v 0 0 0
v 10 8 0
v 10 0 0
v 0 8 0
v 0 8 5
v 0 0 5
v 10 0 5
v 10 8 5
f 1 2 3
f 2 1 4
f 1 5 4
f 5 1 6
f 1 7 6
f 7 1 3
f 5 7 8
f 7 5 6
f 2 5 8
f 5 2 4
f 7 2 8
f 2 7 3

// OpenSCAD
union() {
    translate([0.0, 0.0, 0.0]) cube([1, 1, 1]);
    translate([0.0, 0.0, 1.0]) cube([1, 1, 1]);
    translate([0.0, 0.0, 2.0]) cube([1, 1, 1]);
    translate([0.0, 0.0, 3.0]) cube([1, 1, 1]);
    translate([0.0, 0.0, 4.0]) cube([1, 1, 1]);
    translate([0.0, 1.0, 0.0]) cube([1, 1, 1]);
    translate([0.0, 1.0, 1.0]) cube([1, 1, 1]);
    translate([0.0, 1.0, 2.0]) cube([1, 1, 1]);
    translate([0.0, 1.0, 3.0]) cube([1, 1, 1]);
    translate([0.0, 1.0, 4.0]) cube([1, 1, 1]);
    translate([0.0, 2.0, 0.0]) cube([1, 1, 1]);
    translate([0.0, 2.0, 1.0]) cube([1, 1, 1]);
    translate([0.0, 2.0, 2.0]) cube([1, 1, 1]);
    translate([0.0, 2.0, 3.0]) cube([1, 1, 1]);
    translate([0.0, 2.0, 4.0]) cube([1, 1, 1]);
    translate([0.0, 3.0, 0.0]) cube([1, 1, 1]);
    translate([0.0, 3.0, 1.0]) cube([1, 1, 1]);
    translate([0.0, 3.0, 2.0]) cube([1, 1, 1]);
    translate([0.0, 3.0, 3.0]) cube([1, 1, 1]);
    translate([0.0, 3.0, 4.0]) cube([1, 1, 1]);
    translate([0.0, 4.0, 0.0]) cube([1, 1, 1]);
    translate([0.0, 4.0, 1.0]) cube([1, 1, 1]);
    translate([0.0, 4.0, 2.0]) cube([1, 1, 1]);
    translate([0.0, 4.0, 3.0]) cube([1, 1, 1]);
    translate([0.0, 4.0, 4.0]) cube([1, 1, 1]);
    translate([0.0, 5.0, 0.0]) cube([1, 1, 1]);
    translate([0.0, 5.0, 1.0]) cube([1, 1, 1]);
    translate([0.0, 5.0, 2.0]) cube([1, 1, 1]);
    translate([0.0, 5.0, 3.0]) cube([1, 1, 1]);
    translate([0.0, 5.0, 4.0]) cube([1, 1, 1]);
    translate([0.0, 6.0, 0.0]) cube([1, 1, 1]);
    translate([0.0, 6.0, 1.0]) cube([1, 1, 1]);
    translate([0.0, 6.0, 2.0]) cube([1, 1, 1]);
    translate([0.0, 6.0, 3.0]) cube([1, 1, 1]);
    translate([0.0, 6.0, 4.0]) cube([1, 1, 1]);
    translate([0.0, 7.0, 0.0]) cube([1, 1, 1]);
    translate([0.0, 7.0, 1.0]) cube([1, 1, 1]);
    translate([0.0, 7.0, 2.0]) cube([1, 1, 1]);
    translate([0.0, 7.0, 3.0]) cube([1, 1, 1]);
    translate([0.0, 7.0, 4.0]) cube([1, 1, 1]);
    translate([1.0, 0.0, 0.0]) cube([1, 1, 1]);
    translate([1.0, 0.0, 1.0]) cube([1, 1, 1]);
    translate([1.0, 0.0, 2.0]) cube([1, 1, 1]);
    translate([1.0, 0.0, 3.0]) cube([1, 1, 1]);
    translate([1.0, 0.0, 4.0]) cube([1, 1, 1]);
    translate([1.0, 1.0, 0.0]) cube([1, 1, 1]);
    translate([1.0, 1.0, 1.0]) cube([1, 1, 1]);
    translate([1.0, 1.0, 2.0]) cube([1, 1, 1]);
    translate([1.0, 1.0, 3.0]) cube([1, 1, 1]);
    translate([1.0, 1.0, 4.0]) cube([1, 1, 1]);
    translate([1.0, 2.0, 0.0]) cube([1, 1, 1]);
    translate([1.0, 2.0, 1.0]) cube([1, 1, 1]);
    translate([1.0, 2.0, 2.0]) cube([1, 1, 1]);
    translate([1.0, 2.0, 3.0]) cube([1, 1, 1]);
    translate([1.0, 2.0, 4.0]) cube([1, 1, 1]);
    translate([1.0, 3.0, 0.0]) cube([1, 1, 1]);
    translate([1.0, 3.0, 1.0]) cube([1, 1, 1]);
    translate([1.0, 3.0, 2.0]) cube([1, 1, 1]);
    translate([1.0, 3.0, 3.0]) cube([1, 1, 1]);
    translate([1.0, 3.0, 4.0]) cube([1, 1, 1]);
    translate([1.0, 4.0, 0.0]) cube([1, 1, 1]);
    translate([1.0, 4.0, 1.0]) cube([1, 1, 1]);
    translate([1.0, 4.0, 2.0]) cube([1, 1, 1]);
    translate([1.0, 4.0, 3.0]) cube([1, 1, 1]);
    translate([1.0, 4.0, 4.0]) cube([1, 1, 1]);
    translate([1.0, 5.0, 0.0]) cube([1, 1, 1]);
    translate([1.0, 5.0, 1.0]) cube([1, 1, 1]);
    translate([1.0, 5.0, 2.0]) cube([1, 1, 1]);
    translate([1.0, 5.0, 3.0]) cube([1, 1, 1]);
    translate([1.0, 5.0, 4.0]) cube([1, 1, 1]);
    translate([1.0, 6.0, 0.0]) cube([1, 1, 1]);
    translate([1.0, 6.0, 1.0]) cube([1, 1, 1]);
    translate([1.0, 6.0, 2.0]) cube([1, 1, 1]);
    translate([1.0, 6.0, 3.0]) cube([1, 1, 1]);
    translate([1.0, 6.0, 4.0]) cube([1, 1, 1]);
    translate([1.0, 7.0, 0.0]) cube([1, 1, 1]);
    translate([1.0, 7.0, 1.0]) cube([1, 1, 1]);
    translate([1.0, 7.0, 2.0]) cube([1, 1, 1]);
    translate([1.0, 7.0, 3.0]) cube([1, 1, 1]);
    translate([1.0, 7.0, 4.0]) cube([1, 1, 1]);
    translate([2.0, 0.0, 0.0]) cube([1, 1, 1]);
    translate([2.0, 0.0, 1.0]) cube([1, 1, 1]);
    translate([2.0, 0.0, 2.0]) cube([1, 1, 1]);
    translate([2.0, 0.0, 3.0]) cube([1, 1, 1]);
    translate([2.0, 0.0, 4.0]) cube([1, 1, 1]);
    translate([2.0, 1.0, 0.0]) cube([1, 1, 1]);
    translate([2.0, 1.0, 1.0]) cube([1, 1, 1]);
    translate([2.0, 1.0, 2.0]) cube([1, 1, 1]);
    translate([2.0, 1.0, 3.0]) cube([1, 1, 1]);
    translate([2.0, 1.0, 4.0]) cube([1, 1, 1]);
    translate([2.0, 2.0, 0.0]) cube([1, 1, 1]);
    translate([2.0, 2.0, 1.0]) cube([1, 1, 1]);
    translate([2.0, 2.0, 2.0]) cube([1, 1, 1]);
    translate([2.0, 2.0, 3.0]) cube([1, 1, 1]);
    translate([2.0, 2.0, 4.0]) cube([1, 1, 1]);
    translate([2.0, 3.0, 0.0]) cube([1, 1, 1]);
    translate([2.0, 3.0, 1.0]) cube([1, 1, 1]);
    translate([2.0, 3.0, 2.0]) cube([1, 1, 1]);
    translate([2.0, 3.0, 3.0]) cube([1, 1, 1]);
    translate([2.0, 3.0, 4.0]) cube([1, 1, 1]);
    translate([2.0, 4.0, 0.0]) cube([1, 1, 1]);
    translate([2.0, 4.0, 1.0]) cube([1, 1, 1]);
    translate([2.0, 4.0, 2.0]) cube([1, 1, 1]);
    translate([2.0, 4.0, 3.0]) cube([1, 1, 1]);
    translate([2.0, 4.0, 4.0]) cube([1, 1, 1]);
    translate([2.0, 5.0, 0.0]) cube([1, 1, 1]);
    translate([2.0, 5.0, 1.0]) cube([1, 1, 1]);
    translate([2.0, 5.0, 2.0]) cube([1, 1, 1]);
    translate([2.0, 5.0, 3.0]) cube([1, 1, 1]);
    translate([2.0, 5.0, 4.0]) cube([1, 1, 1]);
    translate([2.0, 6.0, 0.0]) cube([1, 1, 1]);
    translate([2.0, 6.0, 1.0]) cube([1, 1, 1]);
    translate([2.0, 6.0, 2.0]) cube([1, 1, 1]);
    translate([2.0, 6.0, 3.0]) cube([1, 1, 1]);
    translate([2.0, 6.0, 4.0]) cube([1, 1, 1]);
    translate([2.0, 7.0, 0.0]) cube([1, 1, 1]);
    translate([2.0, 7.0, 1.0]) cube([1, 1, 1]);
    translate([2.0, 7.0, 2.0]) cube([1, 1, 1]);
    translate([2.0, 7.0, 3.0]) cube([1, 1, 1]);
    translate([2.0, 7.0, 4.0]) cube([1, 1, 1]);
    translate([3.0, 0.0, 0.0]) cube([1, 1, 1]);
    translate([3.0, 0.0, 1.0]) cube([1, 1, 1]);
    translate([3.0, 0.0, 2.0]) cube([1, 1, 1]);
    translate([3.0, 0.0, 3.0]) cube([1, 1, 1]);
    translate([3.0, 0.0, 4.0]) cube([1, 1, 1]);
    translate([3.0, 1.0, 0.0]) cube([1, 1, 1]);
    translate([3.0, 1.0, 1.0]) cube([1, 1, 1]);
    translate([3.0, 1.0, 2.0]) cube([1, 1, 1]);
    translate([3.0, 1.0, 3.0]) cube([1, 1, 1]);
    translate([3.0, 1.0, 4.0]) cube([1, 1, 1]);
    translate([3.0, 2.0, 0.0]) cube([1, 1, 1]);
    translate([3.0, 2.0, 1.0]) cube([1, 1, 1]);
    translate([3.0, 2.0, 2.0]) cube([1, 1, 1]);
    translate([3.0, 2.0, 3.0]) cube([1, 1, 1]);
    translate([3.0, 2.0, 4.0]) cube([1, 1, 1]);
    translate([3.0, 3.0, 0.0]) cube([1, 1, 1]);
    translate([3.0, 3.0, 1.0]) cube([1, 1, 1]);
    translate([3.0, 3.0, 2.0]) cube([1, 1, 1]);
    translate([3.0, 3.0, 3.0]) cube([1, 1, 1]);
    translate([3.0, 3.0, 4.0]) cube([1, 1, 1]);
    translate([3.0, 4.0, 0.0]) cube([1, 1, 1]);
    translate([3.0, 4.0, 1.0]) cube([1, 1, 1]);
    translate([3.0, 4.0, 2.0]) cube([1, 1, 1]);
    translate([3.0, 4.0, 3.0]) cube([1, 1, 1]);
    translate([3.0, 4.0, 4.0]) cube([1, 1, 1]);
    translate([3.0, 5.0, 0.0]) cube([1, 1, 1]);
    translate([3.0, 5.0, 1.0]) cube([1, 1, 1]);
    translate([3.0, 5.0, 2.0]) cube([1, 1, 1]);
    translate([3.0, 5.0, 3.0]) cube([1, 1, 1]);
    translate([3.0, 5.0, 4.0]) cube([1, 1, 1]);
    translate([3.0, 6.0, 0.0]) cube([1, 1, 1]);
    translate([3.0, 6.0, 1.0]) cube([1, 1, 1]);
    translate([3.0, 6.0, 2.0]) cube([1, 1, 1]);
    translate([3.0, 6.0, 3.0]) cube([1, 1, 1]);
    translate([3.0, 6.0, 4.0]) cube([1, 1, 1]);
    translate([3.0, 7.0, 0.0]) cube([1, 1, 1]);
    translate([3.0, 7.0, 1.0]) cube([1, 1, 1]);
    translate([3.0, 7.0, 2.0]) cube([1, 1, 1]);
    translate([3.0, 7.0, 3.0]) cube([1, 1, 1]);
    translate([3.0, 7.0, 4.0]) cube([1, 1, 1]);
    translate([4.0, 0.0, 0.0]) cube([1, 1, 1]);
    translate([4.0, 0.0, 1.0]) cube([1, 1, 1]);
    translate([4.0, 0.0, 2.0]) cube([1, 1, 1]);
    translate([4.0, 0.0, 3.0]) cube([1, 1, 1]);
    translate([4.0, 0.0, 4.0]) cube([1, 1, 1]);
    translate([4.0, 1.0, 0.0]) cube([1, 1, 1]);
    translate([4.0, 1.0, 1.0]) cube([1, 1, 1]);
    translate([4.0, 1.0, 2.0]) cube([1, 1, 1]);
    translate([4.0, 1.0, 3.0]) cube([1, 1, 1]);
    translate([4.0, 1.0, 4.0]) cube([1, 1, 1]);
    translate([4.0, 2.0, 0.0]) cube([1, 1, 1]);
    translate([4.0, 2.0, 1.0]) cube([1, 1, 1]);
    translate([4.0, 2.0, 2.0]) cube([1, 1, 1]);
    translate([4.0, 2.0, 3.0]) cube([1, 1, 1]);
    translate([4.0, 2.0, 4.0]) cube([1, 1, 1]);
    translate([4.0, 3.0, 0.0]) cube([1, 1, 1]);
    translate([4.0, 3.0, 1.0]) cube([1, 1, 1]);
    translate([4.0, 3.0, 2.0]) cube([1, 1, 1]);
    translate([4.0, 3.0, 3.0]) cube([1, 1, 1]);
    translate([4.0, 3.0, 4.0]) cube([1, 1, 1]);
    translate([4.0, 4.0, 0.0]) cube([1, 1, 1]);
    translate([4.0, 4.0, 1.0]) cube([1, 1, 1]);
    translate([4.0, 4.0, 2.0]) cube([1, 1, 1]);
    translate([4.0, 4.0, 3.0]) cube([1, 1, 1]);
    translate([4.0, 4.0, 4.0]) cube([1, 1, 1]);
    translate([4.0, 5.0, 0.0]) cube([1, 1, 1]);
    translate([4.0, 5.0, 1.0]) cube([1, 1, 1]);
    translate([4.0, 5.0, 2.0]) cube([1, 1, 1]);
    translate([4.0, 5.0, 3.0]) cube([1, 1, 1]);
    translate([4.0, 5.0, 4.0]) cube([1, 1, 1]);
    translate([4.0, 6.0, 0.0]) cube([1, 1, 1]);
    translate([4.0, 6.0, 1.0]) cube([1, 1, 1]);
    translate([4.0, 6.0, 2.0]) cube([1, 1, 1]);
    translate([4.0, 6.0, 3.0]) cube([1, 1, 1]);
    translate([4.0, 6.0, 4.0]) cube([1, 1, 1]);
    translate([4.0, 7.0, 0.0]) cube([1, 1, 1]);
    translate([4.0, 7.0, 1.0]) cube([1, 1, 1]);
    translate([4.0, 7.0, 2.0]) cube([1, 1, 1]);
    translate([4.0, 7.0, 3.0]) cube([1, 1, 1]);
    translate([4.0, 7.0, 4.0]) cube([1, 1, 1]);
    translate([5.0, 0.0, 0.0]) cube([1, 1, 1]);
    translate([5.0, 0.0, 1.0]) cube([1, 1, 1]);
    translate([5.0, 0.0, 2.0]) cube([1, 1, 1]);
    translate([5.0, 0.0, 3.0]) cube([1, 1, 1]);
    translate([5.0, 0.0, 4.0]) cube([1, 1, 1]);
    translate([5.0, 1.0, 0.0]) cube([1, 1, 1]);
    translate([5.0, 1.0, 1.0]) cube([1, 1, 1]);
    translate([5.0, 1.0, 2.0]) cube([1, 1, 1]);
    translate([5.0, 1.0, 3.0]) cube([1, 1, 1]);
    translate([5.0, 1.0, 4.0]) cube([1, 1, 1]);
    translate([5.0, 2.0, 0.0]) cube([1, 1, 1]);
    translate([5.0, 2.0, 1.0]) cube([1, 1, 1]);
    translate([5.0, 2.0, 2.0]) cube([1, 1, 1]);
    translate([5.0, 2.0, 3.0]) cube([1, 1, 1]);
    translate([5.0, 2.0, 4.0]) cube([1, 1, 1]);
    translate([5.0, 3.0, 0.0]) cube([1, 1, 1]);
    translate([5.0, 3.0, 1.0]) cube([1, 1, 1]);
    translate([5.0, 3.0, 2.0]) cube([1, 1, 1]);
    translate([5.0, 3.0, 3.0]) cube([1, 1, 1]);
    translate([5.0, 3.0, 4.0]) cube([1, 1, 1]);
    translate([5.0, 4.0, 0.0]) cube([1, 1, 1]);
    translate([5.0, 4.0, 1.0]) cube([1, 1, 1]);
    translate([5.0, 4.0, 2.0]) cube([1, 1, 1]);
    translate([5.0, 4.0, 3.0]) cube([1, 1, 1]);
    translate([5.0, 4.0, 4.0]) cube([1, 1, 1]);
    translate([5.0, 5.0, 0.0]) cube([1, 1, 1]);
    translate([5.0, 5.0, 1.0]) cube([1, 1, 1]);
    translate([5.0, 5.0, 2.0]) cube([1, 1, 1]);
    translate([5.0, 5.0, 3.0]) cube([1, 1, 1]);
    translate([5.0, 5.0, 4.0]) cube([1, 1, 1]);
    translate([5.0, 6.0, 0.0]) cube([1, 1, 1]);
    translate([5.0, 6.0, 1.0]) cube([1, 1, 1]);
    translate([5.0, 6.0, 2.0]) cube([1, 1, 1]);
    translate([5.0, 6.0, 3.0]) cube([1, 1, 1]);
    translate([5.0, 6.0, 4.0]) cube([1, 1, 1]);
    translate([5.0, 7.0, 0.0]) cube([1, 1, 1]);
    translate([5.0, 7.0, 1.0]) cube([1, 1, 1]);
    translate([5.0, 7.0, 2.0]) cube([1, 1, 1]);
    translate([5.0, 7.0, 3.0]) cube([1, 1, 1]);
    translate([5.0, 7.0, 4.0]) cube([1, 1, 1]);
    translate([6.0, 0.0, 0.0]) cube([1, 1, 1]);
    translate([6.0, 0.0, 1.0]) cube([1, 1, 1]);
    translate([6.0, 0.0, 2.0]) cube([1, 1, 1]);
    translate([6.0, 0.0, 3.0]) cube([1, 1, 1]);
    translate([6.0, 0.0, 4.0]) cube([1, 1, 1]);
    translate([6.0, 1.0, 0.0]) cube([1, 1, 1]);
    translate([6.0, 1.0, 1.0]) cube([1, 1, 1]);
    translate([6.0, 1.0, 2.0]) cube([1, 1, 1]);
    translate([6.0, 1.0, 3.0]) cube([1, 1, 1]);
    translate([6.0, 1.0, 4.0]) cube([1, 1, 1]);
    translate([6.0, 2.0, 0.0]) cube([1, 1, 1]);
    translate([6.0, 2.0, 1.0]) cube([1, 1, 1]);
    translate([6.0, 2.0, 2.0]) cube([1, 1, 1]);
    translate([6.0, 2.0, 3.0]) cube([1, 1, 1]);
    translate([6.0, 2.0, 4.0]) cube([1, 1, 1]);
    translate([6.0, 3.0, 0.0]) cube([1, 1, 1]);
    translate([6.0, 3.0, 1.0]) cube([1, 1, 1]);
    translate([6.0, 3.0, 2.0]) cube([1, 1, 1]);
    translate([6.0, 3.0, 3.0]) cube([1, 1, 1]);
    translate([6.0, 3.0, 4.0]) cube([1, 1, 1]);
    translate([6.0, 4.0, 0.0]) cube([1, 1, 1]);
    translate([6.0, 4.0, 1.0]) cube([1, 1, 1]);
    translate([6.0, 4.0, 2.0]) cube([1, 1, 1]);
    translate([6.0, 4.0, 3.0]) cube([1, 1, 1]);
    translate([6.0, 4.0, 4.0]) cube([1, 1, 1]);
    translate([6.0, 5.0, 0.0]) cube([1, 1, 1]);
    translate([6.0, 5.0, 1.0]) cube([1, 1, 1]);
    translate([6.0, 5.0, 2.0]) cube([1, 1, 1]);
    translate([6.0, 5.0, 3.0]) cube([1, 1, 1]);
    translate([6.0, 5.0, 4.0]) cube([1, 1, 1]);
    translate([6.0, 6.0, 0.0]) cube([1, 1, 1]);
    translate([6.0, 6.0, 1.0]) cube([1, 1, 1]);
    translate([6.0, 6.0, 2.0]) cube([1, 1, 1]);
    translate([6.0, 6.0, 3.0]) cube([1, 1, 1]);
    translate([6.0, 6.0, 4.0]) cube([1, 1, 1]);
    translate([6.0, 7.0, 0.0]) cube([1, 1, 1]);
    translate([6.0, 7.0, 1.0]) cube([1, 1, 1]);
    translate([6.0, 7.0, 2.0]) cube([1, 1, 1]);
    translate([6.0, 7.0, 3.0]) cube([1, 1, 1]);
    translate([6.0, 7.0, 4.0]) cube([1, 1, 1]);
    translate([7.0, 0.0, 0.0]) cube([1, 1, 1]);
    translate([7.0, 0.0, 1.0]) cube([1, 1, 1]);
    translate([7.0, 0.0, 2.0]) cube([1, 1, 1]);
    translate([7.0, 0.0, 3.0]) cube([1, 1, 1]);
    translate([7.0, 0.0, 4.0]) cube([1, 1, 1]);
    translate([7.0, 1.0, 0.0]) cube([1, 1, 1]);
    translate([7.0, 1.0, 1.0]) cube([1, 1, 1]);
    translate([7.0, 1.0, 2.0]) cube([1, 1, 1]);
    translate([7.0, 1.0, 3.0]) cube([1, 1, 1]);
    translate([7.0, 1.0, 4.0]) cube([1, 1, 1]);
    translate([7.0, 2.0, 0.0]) cube([1, 1, 1]);
    translate([7.0, 2.0, 1.0]) cube([1, 1, 1]);
    translate([7.0, 2.0, 2.0]) cube([1, 1, 1]);
    translate([7.0, 2.0, 3.0]) cube([1, 1, 1]);
    translate([7.0, 2.0, 4.0]) cube([1, 1, 1]);
    translate([7.0, 3.0, 0.0]) cube([1, 1, 1]);
    translate([7.0, 3.0, 1.0]) cube([1, 1, 1]);
    translate([7.0, 3.0, 2.0]) cube([1, 1, 1]);
    translate([7.0, 3.0, 3.0]) cube([1, 1, 1]);
    translate([7.0, 3.0, 4.0]) cube([1, 1, 1]);
    translate([7.0, 4.0, 0.0]) cube([1, 1, 1]);
    translate([7.0, 4.0, 1.0]) cube([1, 1, 1]);
    translate([7.0, 4.0, 2.0]) cube([1, 1, 1]);
    translate([7.0, 4.0, 3.0]) cube([1, 1, 1]);
    translate([7.0, 4.0, 4.0]) cube([1, 1, 1]);
    translate([7.0, 5.0, 0.0]) cube([1, 1, 1]);
    translate([7.0, 5.0, 1.0]) cube([1, 1, 1]);
    translate([7.0, 5.0, 2.0]) cube([1, 1, 1]);
    translate([7.0, 5.0, 3.0]) cube([1, 1, 1]);
    translate([7.0, 5.0, 4.0]) cube([1, 1, 1]);
    translate([7.0, 6.0, 0.0]) cube([1, 1, 1]);
    translate([7.0, 6.0, 1.0]) cube([1, 1, 1]);
    translate([7.0, 6.0, 2.0]) cube([1, 1, 1]);
    translate([7.0, 6.0, 3.0]) cube([1, 1, 1]);
    translate([7.0, 6.0, 4.0]) cube([1, 1, 1]);
    translate([7.0, 7.0, 0.0]) cube([1, 1, 1]);
    translate([7.0, 7.0, 1.0]) cube([1, 1, 1]);
    translate([7.0, 7.0, 2.0]) cube([1, 1, 1]);
    translate([7.0, 7.0, 3.0]) cube([1, 1, 1]);
    translate([7.0, 7.0, 4.0]) cube([1, 1, 1]);
    translate([8.0, 0.0, 0.0]) cube([1, 1, 1]);
    translate([8.0, 0.0, 1.0]) cube([1, 1, 1]);
    translate([8.0, 0.0, 2.0]) cube([1, 1, 1]);
    translate([8.0, 0.0, 3.0]) cube([1, 1, 1]);
    translate([8.0, 0.0, 4.0]) cube([1, 1, 1]);
    translate([8.0, 1.0, 0.0]) cube([1, 1, 1]);
    translate([8.0, 1.0, 1.0]) cube([1, 1, 1]);
    translate([8.0, 1.0, 2.0]) cube([1, 1, 1]);
    translate([8.0, 1.0, 3.0]) cube([1, 1, 1]);
    translate([8.0, 1.0, 4.0]) cube([1, 1, 1]);
    translate([8.0, 2.0, 0.0]) cube([1, 1, 1]);
    translate([8.0, 2.0, 1.0]) cube([1, 1, 1]);
    translate([8.0, 2.0, 2.0]) cube([1, 1, 1]);
    translate([8.0, 2.0, 3.0]) cube([1, 1, 1]);
    translate([8.0, 2.0, 4.0]) cube([1, 1, 1]);
    translate([8.0, 3.0, 0.0]) cube([1, 1, 1]);
    translate([8.0, 3.0, 1.0]) cube([1, 1, 1]);
    translate([8.0, 3.0, 2.0]) cube([1, 1, 1]);
    translate([8.0, 3.0, 3.0]) cube([1, 1, 1]);
    translate([8.0, 3.0, 4.0]) cube([1, 1, 1]);
    translate([8.0, 4.0, 0.0]) cube([1, 1, 1]);
    translate([8.0, 4.0, 1.0]) cube([1, 1, 1]);
    translate([8.0, 4.0, 2.0]) cube([1, 1, 1]);
    translate([8.0, 4.0, 3.0]) cube([1, 1, 1]);
    translate([8.0, 4.0, 4.0]) cube([1, 1, 1]);
    translate([8.0, 5.0, 0.0]) cube([1, 1, 1]);
    translate([8.0, 5.0, 1.0]) cube([1, 1, 1]);
    translate([8.0, 5.0, 2.0]) cube([1, 1, 1]);
    translate([8.0, 5.0, 3.0]) cube([1, 1, 1]);
    translate([8.0, 5.0, 4.0]) cube([1, 1, 1]);
    translate([8.0, 6.0, 0.0]) cube([1, 1, 1]);
    translate([8.0, 6.0, 1.0]) cube([1, 1, 1]);
    translate([8.0, 6.0, 2.0]) cube([1, 1, 1]);
    translate([8.0, 6.0, 3.0]) cube([1, 1, 1]);
    translate([8.0, 6.0, 4.0]) cube([1, 1, 1]);
    translate([8.0, 7.0, 0.0]) cube([1, 1, 1]);
    translate([8.0, 7.0, 1.0]) cube([1, 1, 1]);
    translate([8.0, 7.0, 2.0]) cube([1, 1, 1]);
    translate([8.0, 7.0, 3.0]) cube([1, 1, 1]);
    translate([8.0, 7.0, 4.0]) cube([1, 1, 1]);
    translate([9.0, 0.0, 0.0]) cube([1, 1, 1]);
    translate([9.0, 0.0, 1.0]) cube([1, 1, 1]);
    translate([9.0, 0.0, 2.0]) cube([1, 1, 1]);
    translate([9.0, 0.0, 3.0]) cube([1, 1, 1]);
    translate([9.0, 0.0, 4.0]) cube([1, 1, 1]);
    translate([9.0, 1.0, 0.0]) cube([1, 1, 1]);
    translate([9.0, 1.0, 1.0]) cube([1, 1, 1]);
    translate([9.0, 1.0, 2.0]) cube([1, 1, 1]);
    translate([9.0, 1.0, 3.0]) cube([1, 1, 1]);
    translate([9.0, 1.0, 4.0]) cube([1, 1, 1]);
    translate([9.0, 2.0, 0.0]) cube([1, 1, 1]);
    translate([9.0, 2.0, 1.0]) cube([1, 1, 1]);
    translate([9.0, 2.0, 2.0]) cube([1, 1, 1]);
    translate([9.0, 2.0, 3.0]) cube([1, 1, 1]);
    translate([9.0, 2.0, 4.0]) cube([1, 1, 1]);
    translate([9.0, 3.0, 0.0]) cube([1, 1, 1]);
    translate([9.0, 3.0, 1.0]) cube([1, 1, 1]);
    translate([9.0, 3.0, 2.0]) cube([1, 1, 1]);
    translate([9.0, 3.0, 3.0]) cube([1, 1, 1]);
    translate([9.0, 3.0, 4.0]) cube([1, 1, 1]);
    translate([9.0, 4.0, 0.0]) cube([1, 1, 1]);
    translate([9.0, 4.0, 1.0]) cube([1, 1, 1]);
    translate([9.0, 4.0, 2.0]) cube([1, 1, 1]);
    translate([9.0, 4.0, 3.0]) cube([1, 1, 1]);
    translate([9.0, 4.0, 4.0]) cube([1, 1, 1]);
    translate([9.0, 5.0, 0.0]) cube([1, 1, 1]);
    translate([9.0, 5.0, 1.0]) cube([1, 1, 1]);
    translate([9.0, 5.0, 2.0]) cube([1, 1, 1]);
    translate([9.0, 5.0, 3.0]) cube([1, 1, 1]);
    translate([9.0, 5.0, 4.0]) cube([1, 1, 1]);
    translate([9.0, 6.0, 0.0]) cube([1, 1, 1]);
    translate([9.0, 6.0, 1.0]) cube([1, 1, 1]);
    translate([9.0, 6.0, 2.0]) cube([1, 1, 1]);
    translate([9.0, 6.0, 3.0]) cube([1, 1, 1]);
    translate([9.0, 6.0, 4.0]) cube([1, 1, 1]);
    translate([9.0, 7.0, 0.0]) cube([1, 1, 1]);
    translate([9.0, 7.0, 1.0]) cube([1, 1, 1]);
    translate([9.0, 7.0, 2.0]) cube([1, 1, 1]);
    translate([9.0, 7.0, 3.0]) cube([1, 1, 1]);
    translate([9.0, 7.0, 4.0]) cube([1, 1, 1]);
}
